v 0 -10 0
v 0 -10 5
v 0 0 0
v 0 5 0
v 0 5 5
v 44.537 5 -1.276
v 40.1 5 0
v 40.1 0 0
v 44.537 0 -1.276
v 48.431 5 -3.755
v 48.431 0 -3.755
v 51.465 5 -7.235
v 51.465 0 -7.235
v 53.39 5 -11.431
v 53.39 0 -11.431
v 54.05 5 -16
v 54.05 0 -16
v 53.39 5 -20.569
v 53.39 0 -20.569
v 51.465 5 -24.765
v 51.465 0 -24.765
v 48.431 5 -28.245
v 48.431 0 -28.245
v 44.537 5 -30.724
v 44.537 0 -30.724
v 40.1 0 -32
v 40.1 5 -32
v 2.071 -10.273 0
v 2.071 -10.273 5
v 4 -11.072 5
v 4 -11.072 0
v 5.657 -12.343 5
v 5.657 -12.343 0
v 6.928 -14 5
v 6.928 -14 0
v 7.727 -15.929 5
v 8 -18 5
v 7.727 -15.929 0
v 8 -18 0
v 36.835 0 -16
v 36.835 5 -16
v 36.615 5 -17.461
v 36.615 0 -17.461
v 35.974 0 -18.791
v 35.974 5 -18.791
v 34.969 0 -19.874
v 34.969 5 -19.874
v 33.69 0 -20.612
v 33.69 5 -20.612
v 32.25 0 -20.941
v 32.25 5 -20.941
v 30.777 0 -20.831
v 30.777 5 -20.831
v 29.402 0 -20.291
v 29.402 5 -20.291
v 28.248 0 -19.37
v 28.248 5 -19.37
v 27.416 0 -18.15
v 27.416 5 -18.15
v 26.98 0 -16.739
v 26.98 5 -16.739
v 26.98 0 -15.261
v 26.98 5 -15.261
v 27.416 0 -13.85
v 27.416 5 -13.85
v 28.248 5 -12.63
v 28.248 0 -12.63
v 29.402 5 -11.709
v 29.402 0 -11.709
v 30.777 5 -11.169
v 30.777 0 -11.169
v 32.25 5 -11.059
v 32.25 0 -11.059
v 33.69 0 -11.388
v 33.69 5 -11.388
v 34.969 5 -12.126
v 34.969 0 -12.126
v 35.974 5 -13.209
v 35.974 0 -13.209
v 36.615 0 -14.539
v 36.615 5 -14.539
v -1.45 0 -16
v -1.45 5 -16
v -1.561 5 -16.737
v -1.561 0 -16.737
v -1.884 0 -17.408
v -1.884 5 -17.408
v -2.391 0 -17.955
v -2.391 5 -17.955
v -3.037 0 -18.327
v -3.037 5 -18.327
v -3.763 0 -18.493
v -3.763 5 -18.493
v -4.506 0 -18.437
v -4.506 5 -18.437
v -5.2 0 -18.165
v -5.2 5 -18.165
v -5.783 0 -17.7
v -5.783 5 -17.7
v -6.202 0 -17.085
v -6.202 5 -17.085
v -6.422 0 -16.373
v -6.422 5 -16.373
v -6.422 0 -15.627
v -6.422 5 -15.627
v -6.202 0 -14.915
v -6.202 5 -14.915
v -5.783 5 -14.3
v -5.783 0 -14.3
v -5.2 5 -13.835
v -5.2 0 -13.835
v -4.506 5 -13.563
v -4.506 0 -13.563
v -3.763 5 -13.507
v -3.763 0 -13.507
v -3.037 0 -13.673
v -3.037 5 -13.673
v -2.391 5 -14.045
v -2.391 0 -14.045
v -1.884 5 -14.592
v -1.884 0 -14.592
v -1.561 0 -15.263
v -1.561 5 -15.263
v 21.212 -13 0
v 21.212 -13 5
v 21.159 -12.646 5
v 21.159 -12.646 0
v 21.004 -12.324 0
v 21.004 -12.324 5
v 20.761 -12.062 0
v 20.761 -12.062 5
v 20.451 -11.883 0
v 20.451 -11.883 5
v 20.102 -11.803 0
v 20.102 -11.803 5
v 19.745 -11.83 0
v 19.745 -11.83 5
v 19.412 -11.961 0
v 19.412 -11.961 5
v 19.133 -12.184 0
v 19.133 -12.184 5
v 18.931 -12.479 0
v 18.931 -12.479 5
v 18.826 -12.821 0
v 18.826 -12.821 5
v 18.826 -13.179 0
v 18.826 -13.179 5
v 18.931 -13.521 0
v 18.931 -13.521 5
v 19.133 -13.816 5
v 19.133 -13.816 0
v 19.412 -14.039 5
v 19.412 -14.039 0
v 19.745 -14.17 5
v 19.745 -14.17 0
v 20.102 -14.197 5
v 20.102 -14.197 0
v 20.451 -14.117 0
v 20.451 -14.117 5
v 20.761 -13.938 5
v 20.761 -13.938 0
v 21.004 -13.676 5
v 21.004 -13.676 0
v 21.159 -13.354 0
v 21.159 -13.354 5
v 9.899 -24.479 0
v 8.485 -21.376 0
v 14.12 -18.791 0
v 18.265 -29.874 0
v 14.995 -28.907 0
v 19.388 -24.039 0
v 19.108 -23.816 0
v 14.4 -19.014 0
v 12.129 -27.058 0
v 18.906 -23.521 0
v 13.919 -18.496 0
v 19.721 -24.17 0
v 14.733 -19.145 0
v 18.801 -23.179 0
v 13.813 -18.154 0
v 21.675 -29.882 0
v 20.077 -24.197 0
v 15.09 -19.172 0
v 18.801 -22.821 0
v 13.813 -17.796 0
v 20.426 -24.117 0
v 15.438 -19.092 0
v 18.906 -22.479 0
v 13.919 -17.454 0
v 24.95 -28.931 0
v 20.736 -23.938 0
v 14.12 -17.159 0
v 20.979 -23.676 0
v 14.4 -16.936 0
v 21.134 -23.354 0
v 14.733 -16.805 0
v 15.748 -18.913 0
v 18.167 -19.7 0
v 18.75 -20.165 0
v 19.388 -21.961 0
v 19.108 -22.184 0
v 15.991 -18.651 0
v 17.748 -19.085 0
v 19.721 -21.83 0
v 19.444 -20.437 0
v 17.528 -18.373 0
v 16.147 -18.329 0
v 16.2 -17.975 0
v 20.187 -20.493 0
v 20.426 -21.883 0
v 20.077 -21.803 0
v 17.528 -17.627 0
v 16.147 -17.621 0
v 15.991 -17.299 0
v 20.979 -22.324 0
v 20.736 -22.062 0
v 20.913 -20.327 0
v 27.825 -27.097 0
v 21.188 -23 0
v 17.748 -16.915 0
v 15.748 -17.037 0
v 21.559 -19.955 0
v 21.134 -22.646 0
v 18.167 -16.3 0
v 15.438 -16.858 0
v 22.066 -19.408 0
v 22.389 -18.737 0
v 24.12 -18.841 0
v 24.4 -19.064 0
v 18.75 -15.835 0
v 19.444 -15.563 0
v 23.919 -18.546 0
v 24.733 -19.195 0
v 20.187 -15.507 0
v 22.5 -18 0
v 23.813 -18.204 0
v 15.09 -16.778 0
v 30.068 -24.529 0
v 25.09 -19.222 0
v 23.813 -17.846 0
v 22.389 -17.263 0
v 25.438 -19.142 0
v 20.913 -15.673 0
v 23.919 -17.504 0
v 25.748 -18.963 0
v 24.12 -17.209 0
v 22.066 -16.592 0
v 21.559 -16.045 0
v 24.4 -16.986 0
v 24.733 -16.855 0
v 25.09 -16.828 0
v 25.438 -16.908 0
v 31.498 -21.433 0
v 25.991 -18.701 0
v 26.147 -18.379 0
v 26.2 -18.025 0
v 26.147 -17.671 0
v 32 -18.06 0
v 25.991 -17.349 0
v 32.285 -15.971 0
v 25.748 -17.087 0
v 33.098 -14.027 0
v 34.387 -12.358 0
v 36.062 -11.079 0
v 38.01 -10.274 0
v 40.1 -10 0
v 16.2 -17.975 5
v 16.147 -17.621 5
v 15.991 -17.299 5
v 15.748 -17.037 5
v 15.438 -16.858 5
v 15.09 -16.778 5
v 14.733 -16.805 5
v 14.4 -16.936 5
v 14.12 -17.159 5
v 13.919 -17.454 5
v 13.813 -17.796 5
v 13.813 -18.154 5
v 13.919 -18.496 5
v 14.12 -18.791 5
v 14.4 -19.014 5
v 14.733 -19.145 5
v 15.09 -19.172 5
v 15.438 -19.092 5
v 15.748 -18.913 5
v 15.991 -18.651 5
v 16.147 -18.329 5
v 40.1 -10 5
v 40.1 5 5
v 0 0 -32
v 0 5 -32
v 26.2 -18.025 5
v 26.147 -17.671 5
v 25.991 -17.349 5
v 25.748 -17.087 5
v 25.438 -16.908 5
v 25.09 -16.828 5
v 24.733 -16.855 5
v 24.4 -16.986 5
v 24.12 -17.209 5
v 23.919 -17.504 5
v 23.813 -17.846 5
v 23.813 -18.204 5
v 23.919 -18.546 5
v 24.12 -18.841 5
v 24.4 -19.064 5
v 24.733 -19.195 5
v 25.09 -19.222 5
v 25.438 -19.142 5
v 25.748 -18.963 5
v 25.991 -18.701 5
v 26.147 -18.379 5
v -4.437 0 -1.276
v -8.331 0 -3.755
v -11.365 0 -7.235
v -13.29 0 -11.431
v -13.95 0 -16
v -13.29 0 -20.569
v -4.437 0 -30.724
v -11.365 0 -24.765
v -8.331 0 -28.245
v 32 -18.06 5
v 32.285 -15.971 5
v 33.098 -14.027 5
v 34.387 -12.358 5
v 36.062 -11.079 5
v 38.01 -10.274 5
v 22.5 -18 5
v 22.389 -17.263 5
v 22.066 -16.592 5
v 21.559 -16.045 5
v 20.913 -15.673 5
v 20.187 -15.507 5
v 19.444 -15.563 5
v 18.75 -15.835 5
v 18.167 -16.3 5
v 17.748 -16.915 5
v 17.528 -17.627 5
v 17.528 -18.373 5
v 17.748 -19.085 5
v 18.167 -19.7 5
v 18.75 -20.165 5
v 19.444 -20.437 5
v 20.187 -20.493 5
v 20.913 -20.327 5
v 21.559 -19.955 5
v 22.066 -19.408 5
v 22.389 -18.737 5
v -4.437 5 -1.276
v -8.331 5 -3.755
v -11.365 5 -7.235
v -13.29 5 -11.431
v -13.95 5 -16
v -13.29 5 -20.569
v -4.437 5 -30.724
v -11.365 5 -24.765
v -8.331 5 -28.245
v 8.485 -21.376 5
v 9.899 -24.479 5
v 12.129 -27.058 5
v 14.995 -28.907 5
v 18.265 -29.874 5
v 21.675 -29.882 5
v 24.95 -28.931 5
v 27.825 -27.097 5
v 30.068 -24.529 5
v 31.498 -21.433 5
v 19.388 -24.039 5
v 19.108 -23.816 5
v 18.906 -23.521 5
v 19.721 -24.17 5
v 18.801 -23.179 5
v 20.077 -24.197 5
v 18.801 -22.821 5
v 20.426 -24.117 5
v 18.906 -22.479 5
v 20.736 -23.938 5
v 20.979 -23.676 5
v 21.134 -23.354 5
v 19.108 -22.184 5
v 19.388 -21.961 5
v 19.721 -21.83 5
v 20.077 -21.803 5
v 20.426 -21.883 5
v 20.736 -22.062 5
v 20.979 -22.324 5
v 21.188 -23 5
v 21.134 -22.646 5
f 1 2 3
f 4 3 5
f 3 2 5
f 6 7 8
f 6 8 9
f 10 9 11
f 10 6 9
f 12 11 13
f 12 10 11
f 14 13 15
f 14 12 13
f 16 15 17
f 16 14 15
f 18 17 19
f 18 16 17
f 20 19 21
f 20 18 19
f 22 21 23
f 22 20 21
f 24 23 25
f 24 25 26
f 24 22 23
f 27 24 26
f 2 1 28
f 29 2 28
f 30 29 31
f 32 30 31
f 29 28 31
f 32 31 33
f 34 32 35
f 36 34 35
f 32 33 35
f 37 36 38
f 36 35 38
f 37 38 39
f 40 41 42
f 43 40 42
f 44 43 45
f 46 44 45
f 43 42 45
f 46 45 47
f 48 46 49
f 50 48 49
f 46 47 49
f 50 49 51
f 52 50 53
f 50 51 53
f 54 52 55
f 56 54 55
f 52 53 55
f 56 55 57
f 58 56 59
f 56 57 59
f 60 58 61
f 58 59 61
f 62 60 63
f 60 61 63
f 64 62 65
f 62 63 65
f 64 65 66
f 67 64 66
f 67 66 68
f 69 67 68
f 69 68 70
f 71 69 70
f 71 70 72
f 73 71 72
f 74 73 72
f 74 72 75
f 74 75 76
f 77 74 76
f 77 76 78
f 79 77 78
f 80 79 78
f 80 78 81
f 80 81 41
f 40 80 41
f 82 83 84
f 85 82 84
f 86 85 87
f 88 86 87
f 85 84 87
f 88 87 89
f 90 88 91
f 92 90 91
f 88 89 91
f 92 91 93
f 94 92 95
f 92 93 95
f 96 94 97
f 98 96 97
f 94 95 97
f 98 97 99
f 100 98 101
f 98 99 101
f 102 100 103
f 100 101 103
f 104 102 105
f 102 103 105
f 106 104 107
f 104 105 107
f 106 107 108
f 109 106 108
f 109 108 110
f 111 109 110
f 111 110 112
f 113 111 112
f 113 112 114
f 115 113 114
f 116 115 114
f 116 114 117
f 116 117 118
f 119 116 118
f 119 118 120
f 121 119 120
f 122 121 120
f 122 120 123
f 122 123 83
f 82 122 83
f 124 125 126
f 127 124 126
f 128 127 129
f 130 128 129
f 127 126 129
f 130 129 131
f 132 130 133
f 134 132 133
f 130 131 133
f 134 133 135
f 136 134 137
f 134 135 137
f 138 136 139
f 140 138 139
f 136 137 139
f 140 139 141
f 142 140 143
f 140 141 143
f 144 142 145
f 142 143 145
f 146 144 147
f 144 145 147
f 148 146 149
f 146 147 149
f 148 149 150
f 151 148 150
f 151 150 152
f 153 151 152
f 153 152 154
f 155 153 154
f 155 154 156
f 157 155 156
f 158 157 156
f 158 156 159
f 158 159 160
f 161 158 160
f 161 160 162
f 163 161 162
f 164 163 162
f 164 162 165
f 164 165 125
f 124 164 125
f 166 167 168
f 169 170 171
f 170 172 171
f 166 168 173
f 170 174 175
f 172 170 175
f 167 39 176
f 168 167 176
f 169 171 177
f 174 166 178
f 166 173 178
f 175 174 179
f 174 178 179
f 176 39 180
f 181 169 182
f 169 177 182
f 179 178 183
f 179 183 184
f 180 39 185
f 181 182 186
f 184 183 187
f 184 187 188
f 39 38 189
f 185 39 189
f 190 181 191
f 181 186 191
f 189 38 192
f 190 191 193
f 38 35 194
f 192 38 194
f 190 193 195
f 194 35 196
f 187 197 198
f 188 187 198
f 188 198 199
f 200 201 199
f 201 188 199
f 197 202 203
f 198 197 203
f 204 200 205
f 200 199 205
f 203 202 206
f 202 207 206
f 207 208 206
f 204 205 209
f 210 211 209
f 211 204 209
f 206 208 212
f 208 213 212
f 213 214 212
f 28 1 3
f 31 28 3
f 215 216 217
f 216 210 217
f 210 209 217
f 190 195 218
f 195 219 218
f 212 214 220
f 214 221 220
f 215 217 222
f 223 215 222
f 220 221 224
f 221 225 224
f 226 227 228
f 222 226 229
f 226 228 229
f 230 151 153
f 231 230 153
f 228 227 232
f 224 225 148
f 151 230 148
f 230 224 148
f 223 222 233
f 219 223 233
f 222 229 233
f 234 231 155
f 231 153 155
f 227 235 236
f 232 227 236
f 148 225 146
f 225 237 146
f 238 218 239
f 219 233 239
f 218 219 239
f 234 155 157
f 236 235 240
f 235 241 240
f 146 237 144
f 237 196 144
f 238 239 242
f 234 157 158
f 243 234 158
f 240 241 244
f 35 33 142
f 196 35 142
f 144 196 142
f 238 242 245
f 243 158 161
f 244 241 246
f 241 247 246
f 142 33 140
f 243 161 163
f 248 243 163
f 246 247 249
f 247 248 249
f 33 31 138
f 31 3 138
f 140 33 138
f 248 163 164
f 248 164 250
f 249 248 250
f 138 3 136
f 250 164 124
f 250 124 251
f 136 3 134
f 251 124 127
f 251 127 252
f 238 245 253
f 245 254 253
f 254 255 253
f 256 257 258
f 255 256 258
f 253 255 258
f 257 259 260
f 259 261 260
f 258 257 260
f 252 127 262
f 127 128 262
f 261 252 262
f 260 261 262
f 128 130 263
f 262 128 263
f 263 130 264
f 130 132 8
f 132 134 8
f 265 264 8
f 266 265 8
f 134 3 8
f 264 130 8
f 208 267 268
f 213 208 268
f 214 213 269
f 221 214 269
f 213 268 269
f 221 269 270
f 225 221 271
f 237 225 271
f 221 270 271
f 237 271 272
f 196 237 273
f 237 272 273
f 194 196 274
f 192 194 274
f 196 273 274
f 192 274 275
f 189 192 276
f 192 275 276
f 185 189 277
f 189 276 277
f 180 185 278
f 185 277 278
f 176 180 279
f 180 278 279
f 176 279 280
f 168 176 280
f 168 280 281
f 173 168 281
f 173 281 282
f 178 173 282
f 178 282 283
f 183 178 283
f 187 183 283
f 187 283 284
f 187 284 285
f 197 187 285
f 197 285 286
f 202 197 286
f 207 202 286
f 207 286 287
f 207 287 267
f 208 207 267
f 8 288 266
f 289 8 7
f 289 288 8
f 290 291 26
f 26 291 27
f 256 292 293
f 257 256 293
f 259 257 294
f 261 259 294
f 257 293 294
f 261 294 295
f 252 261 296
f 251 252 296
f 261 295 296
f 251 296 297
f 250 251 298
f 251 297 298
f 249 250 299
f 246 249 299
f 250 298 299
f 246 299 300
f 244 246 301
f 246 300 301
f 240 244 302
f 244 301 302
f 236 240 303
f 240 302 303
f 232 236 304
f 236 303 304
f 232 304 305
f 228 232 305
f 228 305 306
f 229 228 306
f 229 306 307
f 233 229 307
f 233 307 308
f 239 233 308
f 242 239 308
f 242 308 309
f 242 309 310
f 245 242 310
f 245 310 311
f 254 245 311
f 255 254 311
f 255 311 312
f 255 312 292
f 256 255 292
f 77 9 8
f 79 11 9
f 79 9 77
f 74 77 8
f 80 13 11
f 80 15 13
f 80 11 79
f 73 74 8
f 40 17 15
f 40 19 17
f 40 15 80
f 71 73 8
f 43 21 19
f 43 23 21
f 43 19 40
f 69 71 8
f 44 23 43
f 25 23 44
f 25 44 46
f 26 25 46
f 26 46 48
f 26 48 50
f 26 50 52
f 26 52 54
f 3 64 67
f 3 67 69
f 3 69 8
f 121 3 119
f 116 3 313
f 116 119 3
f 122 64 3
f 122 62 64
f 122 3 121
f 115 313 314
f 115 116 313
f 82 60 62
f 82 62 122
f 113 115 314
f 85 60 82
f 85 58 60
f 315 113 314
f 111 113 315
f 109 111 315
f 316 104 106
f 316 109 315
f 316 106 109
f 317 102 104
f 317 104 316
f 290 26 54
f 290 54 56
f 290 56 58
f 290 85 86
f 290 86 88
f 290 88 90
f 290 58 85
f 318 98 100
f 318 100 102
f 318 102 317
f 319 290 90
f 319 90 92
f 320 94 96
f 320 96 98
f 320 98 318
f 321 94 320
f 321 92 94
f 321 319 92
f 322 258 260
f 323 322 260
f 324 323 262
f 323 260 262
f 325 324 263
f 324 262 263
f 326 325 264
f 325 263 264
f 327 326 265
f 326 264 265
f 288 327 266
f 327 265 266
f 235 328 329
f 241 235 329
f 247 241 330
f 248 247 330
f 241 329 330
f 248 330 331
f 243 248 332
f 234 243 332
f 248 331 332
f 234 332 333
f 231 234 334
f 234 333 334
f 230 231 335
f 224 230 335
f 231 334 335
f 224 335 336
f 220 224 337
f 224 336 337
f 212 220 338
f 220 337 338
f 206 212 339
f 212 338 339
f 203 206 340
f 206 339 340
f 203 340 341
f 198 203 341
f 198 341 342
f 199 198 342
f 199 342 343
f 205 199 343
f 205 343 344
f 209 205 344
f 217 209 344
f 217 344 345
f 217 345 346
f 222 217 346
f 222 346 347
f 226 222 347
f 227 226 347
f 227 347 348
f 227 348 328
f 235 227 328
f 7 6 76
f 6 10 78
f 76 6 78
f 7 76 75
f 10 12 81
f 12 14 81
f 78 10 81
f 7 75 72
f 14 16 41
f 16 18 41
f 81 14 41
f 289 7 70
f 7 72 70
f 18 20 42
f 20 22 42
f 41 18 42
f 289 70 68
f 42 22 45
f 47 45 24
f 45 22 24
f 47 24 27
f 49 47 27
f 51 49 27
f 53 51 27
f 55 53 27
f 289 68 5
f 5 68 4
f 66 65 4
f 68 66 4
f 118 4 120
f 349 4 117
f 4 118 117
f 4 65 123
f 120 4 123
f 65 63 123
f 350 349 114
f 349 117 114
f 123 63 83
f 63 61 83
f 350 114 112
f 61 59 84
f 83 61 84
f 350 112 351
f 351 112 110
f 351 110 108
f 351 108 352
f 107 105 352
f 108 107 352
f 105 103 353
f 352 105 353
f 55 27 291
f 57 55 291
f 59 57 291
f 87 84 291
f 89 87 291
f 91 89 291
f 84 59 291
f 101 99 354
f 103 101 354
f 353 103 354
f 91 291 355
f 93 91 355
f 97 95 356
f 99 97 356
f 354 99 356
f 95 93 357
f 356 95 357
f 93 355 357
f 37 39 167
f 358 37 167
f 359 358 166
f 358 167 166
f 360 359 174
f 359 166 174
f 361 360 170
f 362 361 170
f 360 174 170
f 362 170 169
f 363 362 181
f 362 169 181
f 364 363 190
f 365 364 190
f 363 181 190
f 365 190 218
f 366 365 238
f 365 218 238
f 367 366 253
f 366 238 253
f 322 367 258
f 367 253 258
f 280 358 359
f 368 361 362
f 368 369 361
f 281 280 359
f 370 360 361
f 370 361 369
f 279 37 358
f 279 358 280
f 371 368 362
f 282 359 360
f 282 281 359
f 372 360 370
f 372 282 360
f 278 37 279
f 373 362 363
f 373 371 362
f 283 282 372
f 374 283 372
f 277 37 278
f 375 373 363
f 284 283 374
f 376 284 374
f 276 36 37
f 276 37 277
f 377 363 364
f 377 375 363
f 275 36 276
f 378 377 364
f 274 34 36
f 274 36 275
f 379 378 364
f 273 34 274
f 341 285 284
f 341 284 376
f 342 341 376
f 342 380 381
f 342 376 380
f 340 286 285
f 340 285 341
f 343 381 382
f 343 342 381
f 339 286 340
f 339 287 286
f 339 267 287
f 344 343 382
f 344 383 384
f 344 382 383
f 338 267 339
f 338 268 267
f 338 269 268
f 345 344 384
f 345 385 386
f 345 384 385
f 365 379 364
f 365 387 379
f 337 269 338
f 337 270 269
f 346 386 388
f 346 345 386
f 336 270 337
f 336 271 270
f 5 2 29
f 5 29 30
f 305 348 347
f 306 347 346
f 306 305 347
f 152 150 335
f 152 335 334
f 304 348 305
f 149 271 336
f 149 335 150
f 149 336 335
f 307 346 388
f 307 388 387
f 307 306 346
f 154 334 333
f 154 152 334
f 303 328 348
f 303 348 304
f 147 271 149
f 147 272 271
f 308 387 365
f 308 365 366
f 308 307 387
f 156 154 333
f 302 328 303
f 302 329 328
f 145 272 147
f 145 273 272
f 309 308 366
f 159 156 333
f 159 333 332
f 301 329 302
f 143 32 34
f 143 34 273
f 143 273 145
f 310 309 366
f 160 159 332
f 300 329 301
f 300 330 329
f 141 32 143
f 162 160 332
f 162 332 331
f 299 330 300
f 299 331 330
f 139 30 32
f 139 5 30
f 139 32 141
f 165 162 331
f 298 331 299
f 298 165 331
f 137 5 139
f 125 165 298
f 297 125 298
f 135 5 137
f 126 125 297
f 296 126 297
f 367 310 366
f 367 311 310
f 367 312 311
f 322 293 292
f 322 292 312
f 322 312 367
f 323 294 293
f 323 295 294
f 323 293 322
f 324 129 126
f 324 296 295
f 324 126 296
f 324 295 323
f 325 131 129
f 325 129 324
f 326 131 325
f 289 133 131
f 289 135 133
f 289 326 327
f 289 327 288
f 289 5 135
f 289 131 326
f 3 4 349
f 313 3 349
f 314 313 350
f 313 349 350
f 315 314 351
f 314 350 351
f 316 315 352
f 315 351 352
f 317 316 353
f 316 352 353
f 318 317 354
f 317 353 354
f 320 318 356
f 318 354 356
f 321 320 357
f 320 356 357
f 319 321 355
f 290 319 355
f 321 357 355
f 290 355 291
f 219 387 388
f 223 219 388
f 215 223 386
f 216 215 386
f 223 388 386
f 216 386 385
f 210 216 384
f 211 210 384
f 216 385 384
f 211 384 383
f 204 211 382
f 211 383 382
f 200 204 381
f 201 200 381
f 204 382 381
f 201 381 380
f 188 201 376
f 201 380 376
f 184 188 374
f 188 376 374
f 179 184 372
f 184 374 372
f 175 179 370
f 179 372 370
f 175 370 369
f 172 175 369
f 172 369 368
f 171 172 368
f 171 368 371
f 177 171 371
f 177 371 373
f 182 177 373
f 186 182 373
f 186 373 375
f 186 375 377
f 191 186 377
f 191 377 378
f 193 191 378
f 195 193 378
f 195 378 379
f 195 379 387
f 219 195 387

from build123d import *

# Parameters (mm, degrees)
SKETCH1_W           = 40.1
SKETCH1_H           = 10
BOSS_EXTRUDE1_DEPTH = 5
SKETCH2_W           = 40.1
SKETCH2_H           = 5
BOSS_EXTRUDE2_DEPTH = 37
BOSS_EXTRUDE3_DEPTH = 5
SKETCH4_R           = 1.2
SKETCH4_R_2         = 2.5
CUT_EXTRUDE1_DEPTH  = 38
SKETCH5_R           = 4.955
SKETCH5_R_2         = 2.5
CUT_EXTRUDE2_DEPTH  = 36


with BuildPart() as part:
    # Sketch1 → Boss-Extrude1 (new body)
    with BuildSketch(Plane.XY):
        with Locations((20.05, -5)):
            Rectangle(SKETCH1_W, SKETCH1_H)
        with BuildLine():
            ThreePointArc((8, -18), (19.970074906, -29.999962687), (31.999850748, -18.059850002))
            ThreePointArc((31.999850748, -18.059850002), (34.386559706, -12.358242505), (40.1, -10))
            Line((40.1, -10), (0, -10))
            ThreePointArc((0, -10), (5.656854249, -12.343145751), (8, -18))
        make_face()
    extrude(amount=BOSS_EXTRUDE1_DEPTH)

    # Sketch2 → Boss-Extrude2 (add)
    with BuildSketch(Plane.XY.offset(5)):
        with Locations((20.05, 2.5)):
            Rectangle(SKETCH2_W, SKETCH2_H)
    extrude(amount=-BOSS_EXTRUDE2_DEPTH)

    # Sketch3 → Boss-Extrude3 (add)
    with BuildSketch(Plane(origin=(0, 5, 0), x_dir=(1, 0, 0), z_dir=(0, 1, 0))):
        with BuildLine():
            Line((0, 32), (0, 0))
            ThreePointArc((0, 0), (-13.95, 16), (0, 32))
        make_face()
        with BuildLine():
            Line((40.1, 32), (40.1, 0))
            ThreePointArc((40.1, 0), (54.05, 16), (40.1, 32))
        make_face()
    extrude(amount=-BOSS_EXTRUDE3_DEPTH)

    # Sketch4 → Cut-Extrude1 (cut, through all)
    with BuildSketch(Plane.XY.offset(5)):
        with Locations((20.012468828, -13)):
            Circle(SKETCH4_R)
        with Locations((20, -18)):
            Circle(SKETCH4_R_2)
        with Locations((15, -17.975062189)):
            Circle(SKETCH4_R)
        with Locations((19.987531172, -23)):
            Circle(SKETCH4_R)
        with Locations((25, -18.024937811)):
            Circle(SKETCH4_R)
    extrude(amount=-CUT_EXTRUDE1_DEPTH, mode=Mode.SUBTRACT)

    # Sketch5 → Cut-Extrude2 (cut, through all)
    with BuildSketch(Plane(origin=(0, 5, 0), x_dir=(1, 0, 0), z_dir=(0, 1, 0))):
        with Locations((31.88, 16)):
            Circle(SKETCH5_R)
        with Locations((-3.95, 16)):
            Circle(SKETCH5_R_2)
    extrude(amount=-CUT_EXTRUDE2_DEPTH, mode=Mode.SUBTRACT)


solid = part.part
